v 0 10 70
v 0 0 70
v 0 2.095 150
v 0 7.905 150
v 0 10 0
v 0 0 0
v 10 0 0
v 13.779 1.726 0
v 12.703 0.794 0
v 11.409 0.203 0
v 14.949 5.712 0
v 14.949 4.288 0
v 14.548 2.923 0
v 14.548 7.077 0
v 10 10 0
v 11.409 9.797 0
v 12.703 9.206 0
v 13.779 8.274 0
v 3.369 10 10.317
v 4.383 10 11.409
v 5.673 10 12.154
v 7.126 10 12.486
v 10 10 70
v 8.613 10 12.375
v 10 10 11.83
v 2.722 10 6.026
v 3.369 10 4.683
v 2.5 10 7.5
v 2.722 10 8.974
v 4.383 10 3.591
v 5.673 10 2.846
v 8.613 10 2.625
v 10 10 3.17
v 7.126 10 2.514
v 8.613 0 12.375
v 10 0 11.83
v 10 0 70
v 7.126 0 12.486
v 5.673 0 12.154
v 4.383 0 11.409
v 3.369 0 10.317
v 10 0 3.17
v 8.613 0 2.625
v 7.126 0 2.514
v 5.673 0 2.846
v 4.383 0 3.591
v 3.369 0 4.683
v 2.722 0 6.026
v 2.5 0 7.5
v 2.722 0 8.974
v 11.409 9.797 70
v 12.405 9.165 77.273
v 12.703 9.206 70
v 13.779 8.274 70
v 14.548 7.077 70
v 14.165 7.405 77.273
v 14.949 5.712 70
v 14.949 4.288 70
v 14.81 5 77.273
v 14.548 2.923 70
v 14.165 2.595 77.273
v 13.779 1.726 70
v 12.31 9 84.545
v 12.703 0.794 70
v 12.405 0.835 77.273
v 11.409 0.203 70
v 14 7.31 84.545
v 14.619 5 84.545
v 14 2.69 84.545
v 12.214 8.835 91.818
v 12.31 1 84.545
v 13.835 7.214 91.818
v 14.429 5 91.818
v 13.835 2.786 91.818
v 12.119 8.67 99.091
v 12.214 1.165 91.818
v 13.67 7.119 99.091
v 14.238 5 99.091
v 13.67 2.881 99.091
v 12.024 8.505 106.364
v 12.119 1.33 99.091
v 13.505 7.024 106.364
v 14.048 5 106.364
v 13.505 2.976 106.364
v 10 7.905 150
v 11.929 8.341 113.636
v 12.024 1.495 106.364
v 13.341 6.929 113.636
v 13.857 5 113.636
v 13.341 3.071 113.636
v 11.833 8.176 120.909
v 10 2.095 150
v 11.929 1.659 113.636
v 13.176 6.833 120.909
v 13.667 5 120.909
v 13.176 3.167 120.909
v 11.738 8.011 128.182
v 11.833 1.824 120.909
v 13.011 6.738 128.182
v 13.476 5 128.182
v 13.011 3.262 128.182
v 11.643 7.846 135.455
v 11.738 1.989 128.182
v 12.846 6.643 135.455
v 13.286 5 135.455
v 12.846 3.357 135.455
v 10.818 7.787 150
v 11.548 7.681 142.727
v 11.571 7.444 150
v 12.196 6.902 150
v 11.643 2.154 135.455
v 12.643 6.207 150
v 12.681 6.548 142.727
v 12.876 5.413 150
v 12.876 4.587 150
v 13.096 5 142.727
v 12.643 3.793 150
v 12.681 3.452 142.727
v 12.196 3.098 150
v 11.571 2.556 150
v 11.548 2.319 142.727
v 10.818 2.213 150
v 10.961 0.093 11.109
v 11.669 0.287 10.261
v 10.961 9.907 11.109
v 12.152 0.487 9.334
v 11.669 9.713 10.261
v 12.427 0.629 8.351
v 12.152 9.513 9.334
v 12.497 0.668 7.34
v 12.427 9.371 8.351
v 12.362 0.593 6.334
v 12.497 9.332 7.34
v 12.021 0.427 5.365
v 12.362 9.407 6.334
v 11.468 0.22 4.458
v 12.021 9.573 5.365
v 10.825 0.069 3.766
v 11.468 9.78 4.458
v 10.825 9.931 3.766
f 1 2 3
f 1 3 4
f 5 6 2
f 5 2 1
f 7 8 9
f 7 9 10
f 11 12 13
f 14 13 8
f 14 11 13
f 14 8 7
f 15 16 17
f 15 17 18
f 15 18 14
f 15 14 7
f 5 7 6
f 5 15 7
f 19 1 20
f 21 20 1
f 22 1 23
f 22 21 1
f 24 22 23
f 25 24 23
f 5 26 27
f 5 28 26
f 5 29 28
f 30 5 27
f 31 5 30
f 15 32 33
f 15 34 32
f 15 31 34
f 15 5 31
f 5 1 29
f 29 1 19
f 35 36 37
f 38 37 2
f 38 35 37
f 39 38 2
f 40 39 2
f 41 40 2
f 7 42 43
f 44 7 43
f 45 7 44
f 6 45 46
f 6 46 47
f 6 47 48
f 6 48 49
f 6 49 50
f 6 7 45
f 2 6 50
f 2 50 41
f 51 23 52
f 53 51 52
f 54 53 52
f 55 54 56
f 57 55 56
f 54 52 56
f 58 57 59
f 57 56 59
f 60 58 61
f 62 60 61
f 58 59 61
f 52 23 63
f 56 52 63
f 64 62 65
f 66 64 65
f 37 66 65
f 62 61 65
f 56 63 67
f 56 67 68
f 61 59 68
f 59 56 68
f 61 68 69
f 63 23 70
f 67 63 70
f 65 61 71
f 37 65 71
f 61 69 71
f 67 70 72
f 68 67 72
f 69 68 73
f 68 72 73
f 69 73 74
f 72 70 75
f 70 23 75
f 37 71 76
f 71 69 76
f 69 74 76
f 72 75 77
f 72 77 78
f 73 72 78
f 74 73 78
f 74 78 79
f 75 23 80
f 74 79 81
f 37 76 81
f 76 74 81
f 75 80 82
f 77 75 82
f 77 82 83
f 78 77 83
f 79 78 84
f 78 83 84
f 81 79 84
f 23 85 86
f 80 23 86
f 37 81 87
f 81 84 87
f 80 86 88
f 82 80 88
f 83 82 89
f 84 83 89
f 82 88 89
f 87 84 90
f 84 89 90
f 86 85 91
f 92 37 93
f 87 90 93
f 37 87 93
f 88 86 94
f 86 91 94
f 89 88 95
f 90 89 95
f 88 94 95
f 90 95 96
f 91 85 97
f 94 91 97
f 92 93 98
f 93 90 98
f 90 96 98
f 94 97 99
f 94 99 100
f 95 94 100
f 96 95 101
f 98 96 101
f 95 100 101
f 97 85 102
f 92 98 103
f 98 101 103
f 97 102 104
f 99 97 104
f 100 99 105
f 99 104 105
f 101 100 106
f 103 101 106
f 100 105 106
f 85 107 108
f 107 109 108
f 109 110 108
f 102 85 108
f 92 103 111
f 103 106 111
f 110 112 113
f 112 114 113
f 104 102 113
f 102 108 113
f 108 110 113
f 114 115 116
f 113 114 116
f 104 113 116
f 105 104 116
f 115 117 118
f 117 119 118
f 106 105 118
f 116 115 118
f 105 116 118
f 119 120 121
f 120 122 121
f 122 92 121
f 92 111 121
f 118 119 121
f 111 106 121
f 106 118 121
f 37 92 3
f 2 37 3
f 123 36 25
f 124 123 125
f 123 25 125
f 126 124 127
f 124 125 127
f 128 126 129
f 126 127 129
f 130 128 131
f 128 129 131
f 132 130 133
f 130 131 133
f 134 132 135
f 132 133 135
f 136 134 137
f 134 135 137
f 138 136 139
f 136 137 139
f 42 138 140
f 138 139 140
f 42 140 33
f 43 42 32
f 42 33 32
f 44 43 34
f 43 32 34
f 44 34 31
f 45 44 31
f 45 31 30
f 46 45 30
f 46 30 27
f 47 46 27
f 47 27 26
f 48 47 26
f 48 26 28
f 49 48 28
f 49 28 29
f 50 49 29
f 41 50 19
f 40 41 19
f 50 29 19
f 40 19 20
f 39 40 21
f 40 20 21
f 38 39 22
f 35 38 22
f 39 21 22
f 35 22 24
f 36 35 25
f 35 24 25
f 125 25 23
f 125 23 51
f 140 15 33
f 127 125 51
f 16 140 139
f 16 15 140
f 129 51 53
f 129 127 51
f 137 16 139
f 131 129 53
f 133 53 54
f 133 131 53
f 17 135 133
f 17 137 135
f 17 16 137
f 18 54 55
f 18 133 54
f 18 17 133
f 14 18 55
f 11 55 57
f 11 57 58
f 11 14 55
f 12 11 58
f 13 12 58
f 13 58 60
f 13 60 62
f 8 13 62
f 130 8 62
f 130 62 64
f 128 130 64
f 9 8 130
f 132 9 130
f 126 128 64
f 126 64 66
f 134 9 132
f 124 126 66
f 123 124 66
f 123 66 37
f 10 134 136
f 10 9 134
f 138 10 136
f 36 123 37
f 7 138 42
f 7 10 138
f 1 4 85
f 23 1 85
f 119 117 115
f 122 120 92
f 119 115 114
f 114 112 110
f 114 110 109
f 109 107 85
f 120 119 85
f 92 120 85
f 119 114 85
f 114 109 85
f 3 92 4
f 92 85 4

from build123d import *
from OCP.BRepFilletAPI import BRepFilletAPI_MakeChamfer

# Parameters (mm, degrees)
EXTRUDE_1_DEPTH     = 150
SKETCH_2_R          = 5
CUT_EXTRUDE_2_DEPTH = 152.079449297
CHAMFER_1_SIZE      = 80
CHAMFER_1_SIZE2     = 2.094873726


with BuildPart() as part:
    # 草图1 → 拉伸1 (new body)
    with BuildSketch(Plane.XY):
        with BuildLine():
            Line((0, 10), (10, 10))
            ThreePointArc((10, 10), (15, 5), (10, 0))
            Line((10, 0), (0, 0))
            Line((0, 0), (0, 10))
        make_face()
    extrude(amount=EXTRUDE_1_DEPTH)

    # 草图2 → 拉伸2 (cut, through all)
    with BuildSketch(Plane(origin=(0, 10, 0), x_dir=(1, 0, 0), z_dir=(0, 1, 0))):
        with Locations(Location((7.5, -7.5, 0), (0, 0, 300))):
            Circle(SKETCH_2_R)
    extrude(amount=-CUT_EXTRUDE_2_DEPTH, mode=Mode.SUBTRACT)

    # 倒角1: one chamfer whose edges measure the first distance from different faces: ONE call of the kernel's chamfer builder (chamfer() names one face for all edges)
    chamfer_1_edges_1 = [part.edges().sort_by_distance(p)[0] for p in [
        (15, 5, 150),
    ]]
    chamfer_1_side_1 = [part.faces().sort_by_distance(p)[0] for p in [
        (15, 5, 75),
    ]]
    chamfer_1_edges_2 = [part.edges().sort_by_distance(p)[0] for p in [
        (5, 10, 150),
    ]]
    chamfer_1_side_2 = [part.faces().sort_by_distance(p)[0] for p in [
        (4.927731535, 10, 77.968371884),
    ]]
    chamfer_1_edges_3 = [part.edges().sort_by_distance(p)[0] for p in [
        (5, 0, 150),
    ]]
    chamfer_1_side_3 = [part.faces().sort_by_distance(p)[0] for p in [
        (4.927731535, 0, 77.968371884),
    ]]
    chamfer_1 = BRepFilletAPI_MakeChamfer(part.part.solid().wrapped)
    for e in chamfer_1_edges_1:
        chamfer_1.Add(CHAMFER_1_SIZE, CHAMFER_1_SIZE2, e.wrapped, chamfer_1_side_1[0].wrapped)  # the first distance lies on this face
    for e in chamfer_1_edges_2:
        chamfer_1.Add(CHAMFER_1_SIZE, CHAMFER_1_SIZE2, e.wrapped, chamfer_1_side_2[0].wrapped)  # the first distance lies on this face
    for e in chamfer_1_edges_3:
        chamfer_1.Add(CHAMFER_1_SIZE, CHAMFER_1_SIZE2, e.wrapped, chamfer_1_side_3[0].wrapped)  # the first distance lies on this face
    add(Compound.cast(chamfer_1.Shape()), mode=Mode.REPLACE)


solid = part.part
